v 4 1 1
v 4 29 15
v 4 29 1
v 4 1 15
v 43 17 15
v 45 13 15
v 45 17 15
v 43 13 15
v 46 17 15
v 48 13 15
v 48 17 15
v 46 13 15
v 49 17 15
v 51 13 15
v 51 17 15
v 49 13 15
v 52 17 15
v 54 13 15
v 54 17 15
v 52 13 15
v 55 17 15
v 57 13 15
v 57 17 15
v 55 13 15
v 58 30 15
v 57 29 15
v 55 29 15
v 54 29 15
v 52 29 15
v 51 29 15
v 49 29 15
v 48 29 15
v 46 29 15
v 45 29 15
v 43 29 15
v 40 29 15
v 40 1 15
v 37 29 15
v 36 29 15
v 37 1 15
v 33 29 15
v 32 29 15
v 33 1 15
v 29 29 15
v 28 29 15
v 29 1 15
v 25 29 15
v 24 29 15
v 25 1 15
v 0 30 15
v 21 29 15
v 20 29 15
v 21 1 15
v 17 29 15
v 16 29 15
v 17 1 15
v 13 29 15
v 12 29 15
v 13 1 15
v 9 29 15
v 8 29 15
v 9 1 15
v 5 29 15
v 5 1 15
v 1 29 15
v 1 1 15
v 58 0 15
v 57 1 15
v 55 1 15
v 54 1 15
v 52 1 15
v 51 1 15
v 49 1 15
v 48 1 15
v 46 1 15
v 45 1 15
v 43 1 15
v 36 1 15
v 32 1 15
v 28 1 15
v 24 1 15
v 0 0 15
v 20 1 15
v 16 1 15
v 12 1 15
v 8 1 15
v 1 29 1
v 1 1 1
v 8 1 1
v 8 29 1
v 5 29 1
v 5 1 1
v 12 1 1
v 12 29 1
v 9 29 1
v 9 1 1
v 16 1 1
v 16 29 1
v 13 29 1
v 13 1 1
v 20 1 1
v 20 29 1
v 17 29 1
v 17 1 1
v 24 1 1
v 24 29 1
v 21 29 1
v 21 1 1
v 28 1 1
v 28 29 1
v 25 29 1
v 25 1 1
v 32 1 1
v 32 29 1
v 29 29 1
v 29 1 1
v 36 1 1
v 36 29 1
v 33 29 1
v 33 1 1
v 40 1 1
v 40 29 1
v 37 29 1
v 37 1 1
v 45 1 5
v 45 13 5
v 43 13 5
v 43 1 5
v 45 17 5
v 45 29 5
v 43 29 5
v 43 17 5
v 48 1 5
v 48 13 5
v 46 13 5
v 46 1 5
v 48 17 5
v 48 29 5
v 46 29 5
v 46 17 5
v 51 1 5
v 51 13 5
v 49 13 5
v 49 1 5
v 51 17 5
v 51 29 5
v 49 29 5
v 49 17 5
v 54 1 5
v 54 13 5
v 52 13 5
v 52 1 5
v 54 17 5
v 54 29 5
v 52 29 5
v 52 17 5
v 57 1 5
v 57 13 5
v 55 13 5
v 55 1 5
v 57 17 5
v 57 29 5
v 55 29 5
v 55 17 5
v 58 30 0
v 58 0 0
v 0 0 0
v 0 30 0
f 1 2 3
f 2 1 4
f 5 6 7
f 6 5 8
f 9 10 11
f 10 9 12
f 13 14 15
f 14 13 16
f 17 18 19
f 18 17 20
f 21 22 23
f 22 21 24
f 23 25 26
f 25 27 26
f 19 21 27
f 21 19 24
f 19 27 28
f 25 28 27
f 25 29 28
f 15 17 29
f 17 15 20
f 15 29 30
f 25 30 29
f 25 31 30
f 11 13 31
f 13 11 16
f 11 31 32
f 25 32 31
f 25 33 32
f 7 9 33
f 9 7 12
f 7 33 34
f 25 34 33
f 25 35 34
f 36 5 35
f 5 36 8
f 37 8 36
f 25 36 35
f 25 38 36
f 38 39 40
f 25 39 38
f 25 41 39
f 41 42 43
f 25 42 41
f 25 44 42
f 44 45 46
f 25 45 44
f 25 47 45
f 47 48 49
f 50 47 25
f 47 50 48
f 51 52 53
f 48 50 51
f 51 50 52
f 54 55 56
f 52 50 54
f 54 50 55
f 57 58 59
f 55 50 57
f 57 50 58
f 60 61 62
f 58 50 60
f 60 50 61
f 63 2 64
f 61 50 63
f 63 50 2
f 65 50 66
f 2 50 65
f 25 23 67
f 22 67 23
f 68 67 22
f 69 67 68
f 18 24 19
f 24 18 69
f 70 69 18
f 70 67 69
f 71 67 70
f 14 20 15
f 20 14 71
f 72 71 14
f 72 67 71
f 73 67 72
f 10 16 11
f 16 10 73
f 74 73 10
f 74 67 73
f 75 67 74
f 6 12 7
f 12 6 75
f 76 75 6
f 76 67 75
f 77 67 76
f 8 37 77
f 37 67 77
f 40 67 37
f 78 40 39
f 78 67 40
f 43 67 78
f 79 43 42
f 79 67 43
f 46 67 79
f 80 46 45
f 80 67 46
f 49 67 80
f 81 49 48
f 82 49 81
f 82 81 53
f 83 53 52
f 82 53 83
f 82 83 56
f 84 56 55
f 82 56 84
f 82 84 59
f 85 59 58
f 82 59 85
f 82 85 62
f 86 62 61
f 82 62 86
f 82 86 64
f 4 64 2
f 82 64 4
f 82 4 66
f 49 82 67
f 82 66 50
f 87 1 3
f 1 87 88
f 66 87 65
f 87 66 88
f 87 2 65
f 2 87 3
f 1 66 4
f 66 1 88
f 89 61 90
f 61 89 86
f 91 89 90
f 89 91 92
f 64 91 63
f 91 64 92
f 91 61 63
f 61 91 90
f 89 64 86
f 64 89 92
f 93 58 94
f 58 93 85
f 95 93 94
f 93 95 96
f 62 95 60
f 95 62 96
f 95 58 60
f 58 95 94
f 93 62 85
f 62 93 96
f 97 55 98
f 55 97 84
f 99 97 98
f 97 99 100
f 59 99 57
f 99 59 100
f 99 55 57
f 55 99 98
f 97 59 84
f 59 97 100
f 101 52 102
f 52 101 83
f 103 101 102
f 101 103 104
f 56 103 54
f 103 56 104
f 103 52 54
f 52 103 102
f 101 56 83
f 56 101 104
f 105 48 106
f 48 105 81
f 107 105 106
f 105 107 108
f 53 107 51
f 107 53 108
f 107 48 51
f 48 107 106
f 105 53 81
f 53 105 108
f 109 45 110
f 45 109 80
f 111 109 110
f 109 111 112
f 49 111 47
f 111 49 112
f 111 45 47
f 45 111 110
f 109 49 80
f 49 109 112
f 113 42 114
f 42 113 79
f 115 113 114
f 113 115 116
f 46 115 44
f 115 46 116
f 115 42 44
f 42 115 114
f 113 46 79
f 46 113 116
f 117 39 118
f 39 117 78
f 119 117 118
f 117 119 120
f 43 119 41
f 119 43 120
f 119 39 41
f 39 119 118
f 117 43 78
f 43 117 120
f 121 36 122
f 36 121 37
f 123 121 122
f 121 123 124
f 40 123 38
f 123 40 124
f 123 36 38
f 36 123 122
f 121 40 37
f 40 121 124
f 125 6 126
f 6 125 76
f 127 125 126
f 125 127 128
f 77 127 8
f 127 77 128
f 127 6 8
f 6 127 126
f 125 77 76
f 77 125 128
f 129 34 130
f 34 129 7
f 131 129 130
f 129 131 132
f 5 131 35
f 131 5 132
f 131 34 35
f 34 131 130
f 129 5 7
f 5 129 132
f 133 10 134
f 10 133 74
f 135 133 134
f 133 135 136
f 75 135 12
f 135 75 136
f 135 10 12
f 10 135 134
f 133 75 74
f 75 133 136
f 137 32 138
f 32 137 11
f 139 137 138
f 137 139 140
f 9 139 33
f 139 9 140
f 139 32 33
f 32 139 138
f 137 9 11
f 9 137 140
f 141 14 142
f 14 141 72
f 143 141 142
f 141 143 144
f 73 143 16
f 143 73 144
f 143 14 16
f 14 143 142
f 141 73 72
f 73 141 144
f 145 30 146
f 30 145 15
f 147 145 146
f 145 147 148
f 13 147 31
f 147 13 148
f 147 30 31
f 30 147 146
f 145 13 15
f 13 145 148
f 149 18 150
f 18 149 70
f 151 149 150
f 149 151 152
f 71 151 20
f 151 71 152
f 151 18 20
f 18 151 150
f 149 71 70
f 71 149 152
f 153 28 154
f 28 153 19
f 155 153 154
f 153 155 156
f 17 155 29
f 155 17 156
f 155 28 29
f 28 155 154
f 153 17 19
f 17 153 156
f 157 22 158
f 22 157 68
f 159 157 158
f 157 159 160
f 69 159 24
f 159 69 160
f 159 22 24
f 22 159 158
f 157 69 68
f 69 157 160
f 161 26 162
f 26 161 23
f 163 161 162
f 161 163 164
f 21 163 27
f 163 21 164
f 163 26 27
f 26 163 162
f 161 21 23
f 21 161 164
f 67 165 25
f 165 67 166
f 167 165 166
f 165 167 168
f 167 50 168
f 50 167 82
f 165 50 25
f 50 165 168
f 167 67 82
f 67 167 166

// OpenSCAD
// Variables
fullSize = [58, 30, 15];
sdSize = [3, 28, 14];
usbSize = [6, 14, 14];
msdSize = [2, 12, 10];

// Main cube 
difference() {
    cube(fullSize);

    // The big SD cards
  for(i = [0:9])
    translate([i+1+sdSize[0]*i, 1, 1]) cube(sdSize);

    c = 12+sdSize[0]*10;

  for(i = [0:4]) {
    translate([c+i+1+msdSize[0]*i, 1, 5]) cube(msdSize);
    translate([c+i+1+msdSize[0]*i, msdSize[1]+5, 5]) cube(msdSize);
  }

}
